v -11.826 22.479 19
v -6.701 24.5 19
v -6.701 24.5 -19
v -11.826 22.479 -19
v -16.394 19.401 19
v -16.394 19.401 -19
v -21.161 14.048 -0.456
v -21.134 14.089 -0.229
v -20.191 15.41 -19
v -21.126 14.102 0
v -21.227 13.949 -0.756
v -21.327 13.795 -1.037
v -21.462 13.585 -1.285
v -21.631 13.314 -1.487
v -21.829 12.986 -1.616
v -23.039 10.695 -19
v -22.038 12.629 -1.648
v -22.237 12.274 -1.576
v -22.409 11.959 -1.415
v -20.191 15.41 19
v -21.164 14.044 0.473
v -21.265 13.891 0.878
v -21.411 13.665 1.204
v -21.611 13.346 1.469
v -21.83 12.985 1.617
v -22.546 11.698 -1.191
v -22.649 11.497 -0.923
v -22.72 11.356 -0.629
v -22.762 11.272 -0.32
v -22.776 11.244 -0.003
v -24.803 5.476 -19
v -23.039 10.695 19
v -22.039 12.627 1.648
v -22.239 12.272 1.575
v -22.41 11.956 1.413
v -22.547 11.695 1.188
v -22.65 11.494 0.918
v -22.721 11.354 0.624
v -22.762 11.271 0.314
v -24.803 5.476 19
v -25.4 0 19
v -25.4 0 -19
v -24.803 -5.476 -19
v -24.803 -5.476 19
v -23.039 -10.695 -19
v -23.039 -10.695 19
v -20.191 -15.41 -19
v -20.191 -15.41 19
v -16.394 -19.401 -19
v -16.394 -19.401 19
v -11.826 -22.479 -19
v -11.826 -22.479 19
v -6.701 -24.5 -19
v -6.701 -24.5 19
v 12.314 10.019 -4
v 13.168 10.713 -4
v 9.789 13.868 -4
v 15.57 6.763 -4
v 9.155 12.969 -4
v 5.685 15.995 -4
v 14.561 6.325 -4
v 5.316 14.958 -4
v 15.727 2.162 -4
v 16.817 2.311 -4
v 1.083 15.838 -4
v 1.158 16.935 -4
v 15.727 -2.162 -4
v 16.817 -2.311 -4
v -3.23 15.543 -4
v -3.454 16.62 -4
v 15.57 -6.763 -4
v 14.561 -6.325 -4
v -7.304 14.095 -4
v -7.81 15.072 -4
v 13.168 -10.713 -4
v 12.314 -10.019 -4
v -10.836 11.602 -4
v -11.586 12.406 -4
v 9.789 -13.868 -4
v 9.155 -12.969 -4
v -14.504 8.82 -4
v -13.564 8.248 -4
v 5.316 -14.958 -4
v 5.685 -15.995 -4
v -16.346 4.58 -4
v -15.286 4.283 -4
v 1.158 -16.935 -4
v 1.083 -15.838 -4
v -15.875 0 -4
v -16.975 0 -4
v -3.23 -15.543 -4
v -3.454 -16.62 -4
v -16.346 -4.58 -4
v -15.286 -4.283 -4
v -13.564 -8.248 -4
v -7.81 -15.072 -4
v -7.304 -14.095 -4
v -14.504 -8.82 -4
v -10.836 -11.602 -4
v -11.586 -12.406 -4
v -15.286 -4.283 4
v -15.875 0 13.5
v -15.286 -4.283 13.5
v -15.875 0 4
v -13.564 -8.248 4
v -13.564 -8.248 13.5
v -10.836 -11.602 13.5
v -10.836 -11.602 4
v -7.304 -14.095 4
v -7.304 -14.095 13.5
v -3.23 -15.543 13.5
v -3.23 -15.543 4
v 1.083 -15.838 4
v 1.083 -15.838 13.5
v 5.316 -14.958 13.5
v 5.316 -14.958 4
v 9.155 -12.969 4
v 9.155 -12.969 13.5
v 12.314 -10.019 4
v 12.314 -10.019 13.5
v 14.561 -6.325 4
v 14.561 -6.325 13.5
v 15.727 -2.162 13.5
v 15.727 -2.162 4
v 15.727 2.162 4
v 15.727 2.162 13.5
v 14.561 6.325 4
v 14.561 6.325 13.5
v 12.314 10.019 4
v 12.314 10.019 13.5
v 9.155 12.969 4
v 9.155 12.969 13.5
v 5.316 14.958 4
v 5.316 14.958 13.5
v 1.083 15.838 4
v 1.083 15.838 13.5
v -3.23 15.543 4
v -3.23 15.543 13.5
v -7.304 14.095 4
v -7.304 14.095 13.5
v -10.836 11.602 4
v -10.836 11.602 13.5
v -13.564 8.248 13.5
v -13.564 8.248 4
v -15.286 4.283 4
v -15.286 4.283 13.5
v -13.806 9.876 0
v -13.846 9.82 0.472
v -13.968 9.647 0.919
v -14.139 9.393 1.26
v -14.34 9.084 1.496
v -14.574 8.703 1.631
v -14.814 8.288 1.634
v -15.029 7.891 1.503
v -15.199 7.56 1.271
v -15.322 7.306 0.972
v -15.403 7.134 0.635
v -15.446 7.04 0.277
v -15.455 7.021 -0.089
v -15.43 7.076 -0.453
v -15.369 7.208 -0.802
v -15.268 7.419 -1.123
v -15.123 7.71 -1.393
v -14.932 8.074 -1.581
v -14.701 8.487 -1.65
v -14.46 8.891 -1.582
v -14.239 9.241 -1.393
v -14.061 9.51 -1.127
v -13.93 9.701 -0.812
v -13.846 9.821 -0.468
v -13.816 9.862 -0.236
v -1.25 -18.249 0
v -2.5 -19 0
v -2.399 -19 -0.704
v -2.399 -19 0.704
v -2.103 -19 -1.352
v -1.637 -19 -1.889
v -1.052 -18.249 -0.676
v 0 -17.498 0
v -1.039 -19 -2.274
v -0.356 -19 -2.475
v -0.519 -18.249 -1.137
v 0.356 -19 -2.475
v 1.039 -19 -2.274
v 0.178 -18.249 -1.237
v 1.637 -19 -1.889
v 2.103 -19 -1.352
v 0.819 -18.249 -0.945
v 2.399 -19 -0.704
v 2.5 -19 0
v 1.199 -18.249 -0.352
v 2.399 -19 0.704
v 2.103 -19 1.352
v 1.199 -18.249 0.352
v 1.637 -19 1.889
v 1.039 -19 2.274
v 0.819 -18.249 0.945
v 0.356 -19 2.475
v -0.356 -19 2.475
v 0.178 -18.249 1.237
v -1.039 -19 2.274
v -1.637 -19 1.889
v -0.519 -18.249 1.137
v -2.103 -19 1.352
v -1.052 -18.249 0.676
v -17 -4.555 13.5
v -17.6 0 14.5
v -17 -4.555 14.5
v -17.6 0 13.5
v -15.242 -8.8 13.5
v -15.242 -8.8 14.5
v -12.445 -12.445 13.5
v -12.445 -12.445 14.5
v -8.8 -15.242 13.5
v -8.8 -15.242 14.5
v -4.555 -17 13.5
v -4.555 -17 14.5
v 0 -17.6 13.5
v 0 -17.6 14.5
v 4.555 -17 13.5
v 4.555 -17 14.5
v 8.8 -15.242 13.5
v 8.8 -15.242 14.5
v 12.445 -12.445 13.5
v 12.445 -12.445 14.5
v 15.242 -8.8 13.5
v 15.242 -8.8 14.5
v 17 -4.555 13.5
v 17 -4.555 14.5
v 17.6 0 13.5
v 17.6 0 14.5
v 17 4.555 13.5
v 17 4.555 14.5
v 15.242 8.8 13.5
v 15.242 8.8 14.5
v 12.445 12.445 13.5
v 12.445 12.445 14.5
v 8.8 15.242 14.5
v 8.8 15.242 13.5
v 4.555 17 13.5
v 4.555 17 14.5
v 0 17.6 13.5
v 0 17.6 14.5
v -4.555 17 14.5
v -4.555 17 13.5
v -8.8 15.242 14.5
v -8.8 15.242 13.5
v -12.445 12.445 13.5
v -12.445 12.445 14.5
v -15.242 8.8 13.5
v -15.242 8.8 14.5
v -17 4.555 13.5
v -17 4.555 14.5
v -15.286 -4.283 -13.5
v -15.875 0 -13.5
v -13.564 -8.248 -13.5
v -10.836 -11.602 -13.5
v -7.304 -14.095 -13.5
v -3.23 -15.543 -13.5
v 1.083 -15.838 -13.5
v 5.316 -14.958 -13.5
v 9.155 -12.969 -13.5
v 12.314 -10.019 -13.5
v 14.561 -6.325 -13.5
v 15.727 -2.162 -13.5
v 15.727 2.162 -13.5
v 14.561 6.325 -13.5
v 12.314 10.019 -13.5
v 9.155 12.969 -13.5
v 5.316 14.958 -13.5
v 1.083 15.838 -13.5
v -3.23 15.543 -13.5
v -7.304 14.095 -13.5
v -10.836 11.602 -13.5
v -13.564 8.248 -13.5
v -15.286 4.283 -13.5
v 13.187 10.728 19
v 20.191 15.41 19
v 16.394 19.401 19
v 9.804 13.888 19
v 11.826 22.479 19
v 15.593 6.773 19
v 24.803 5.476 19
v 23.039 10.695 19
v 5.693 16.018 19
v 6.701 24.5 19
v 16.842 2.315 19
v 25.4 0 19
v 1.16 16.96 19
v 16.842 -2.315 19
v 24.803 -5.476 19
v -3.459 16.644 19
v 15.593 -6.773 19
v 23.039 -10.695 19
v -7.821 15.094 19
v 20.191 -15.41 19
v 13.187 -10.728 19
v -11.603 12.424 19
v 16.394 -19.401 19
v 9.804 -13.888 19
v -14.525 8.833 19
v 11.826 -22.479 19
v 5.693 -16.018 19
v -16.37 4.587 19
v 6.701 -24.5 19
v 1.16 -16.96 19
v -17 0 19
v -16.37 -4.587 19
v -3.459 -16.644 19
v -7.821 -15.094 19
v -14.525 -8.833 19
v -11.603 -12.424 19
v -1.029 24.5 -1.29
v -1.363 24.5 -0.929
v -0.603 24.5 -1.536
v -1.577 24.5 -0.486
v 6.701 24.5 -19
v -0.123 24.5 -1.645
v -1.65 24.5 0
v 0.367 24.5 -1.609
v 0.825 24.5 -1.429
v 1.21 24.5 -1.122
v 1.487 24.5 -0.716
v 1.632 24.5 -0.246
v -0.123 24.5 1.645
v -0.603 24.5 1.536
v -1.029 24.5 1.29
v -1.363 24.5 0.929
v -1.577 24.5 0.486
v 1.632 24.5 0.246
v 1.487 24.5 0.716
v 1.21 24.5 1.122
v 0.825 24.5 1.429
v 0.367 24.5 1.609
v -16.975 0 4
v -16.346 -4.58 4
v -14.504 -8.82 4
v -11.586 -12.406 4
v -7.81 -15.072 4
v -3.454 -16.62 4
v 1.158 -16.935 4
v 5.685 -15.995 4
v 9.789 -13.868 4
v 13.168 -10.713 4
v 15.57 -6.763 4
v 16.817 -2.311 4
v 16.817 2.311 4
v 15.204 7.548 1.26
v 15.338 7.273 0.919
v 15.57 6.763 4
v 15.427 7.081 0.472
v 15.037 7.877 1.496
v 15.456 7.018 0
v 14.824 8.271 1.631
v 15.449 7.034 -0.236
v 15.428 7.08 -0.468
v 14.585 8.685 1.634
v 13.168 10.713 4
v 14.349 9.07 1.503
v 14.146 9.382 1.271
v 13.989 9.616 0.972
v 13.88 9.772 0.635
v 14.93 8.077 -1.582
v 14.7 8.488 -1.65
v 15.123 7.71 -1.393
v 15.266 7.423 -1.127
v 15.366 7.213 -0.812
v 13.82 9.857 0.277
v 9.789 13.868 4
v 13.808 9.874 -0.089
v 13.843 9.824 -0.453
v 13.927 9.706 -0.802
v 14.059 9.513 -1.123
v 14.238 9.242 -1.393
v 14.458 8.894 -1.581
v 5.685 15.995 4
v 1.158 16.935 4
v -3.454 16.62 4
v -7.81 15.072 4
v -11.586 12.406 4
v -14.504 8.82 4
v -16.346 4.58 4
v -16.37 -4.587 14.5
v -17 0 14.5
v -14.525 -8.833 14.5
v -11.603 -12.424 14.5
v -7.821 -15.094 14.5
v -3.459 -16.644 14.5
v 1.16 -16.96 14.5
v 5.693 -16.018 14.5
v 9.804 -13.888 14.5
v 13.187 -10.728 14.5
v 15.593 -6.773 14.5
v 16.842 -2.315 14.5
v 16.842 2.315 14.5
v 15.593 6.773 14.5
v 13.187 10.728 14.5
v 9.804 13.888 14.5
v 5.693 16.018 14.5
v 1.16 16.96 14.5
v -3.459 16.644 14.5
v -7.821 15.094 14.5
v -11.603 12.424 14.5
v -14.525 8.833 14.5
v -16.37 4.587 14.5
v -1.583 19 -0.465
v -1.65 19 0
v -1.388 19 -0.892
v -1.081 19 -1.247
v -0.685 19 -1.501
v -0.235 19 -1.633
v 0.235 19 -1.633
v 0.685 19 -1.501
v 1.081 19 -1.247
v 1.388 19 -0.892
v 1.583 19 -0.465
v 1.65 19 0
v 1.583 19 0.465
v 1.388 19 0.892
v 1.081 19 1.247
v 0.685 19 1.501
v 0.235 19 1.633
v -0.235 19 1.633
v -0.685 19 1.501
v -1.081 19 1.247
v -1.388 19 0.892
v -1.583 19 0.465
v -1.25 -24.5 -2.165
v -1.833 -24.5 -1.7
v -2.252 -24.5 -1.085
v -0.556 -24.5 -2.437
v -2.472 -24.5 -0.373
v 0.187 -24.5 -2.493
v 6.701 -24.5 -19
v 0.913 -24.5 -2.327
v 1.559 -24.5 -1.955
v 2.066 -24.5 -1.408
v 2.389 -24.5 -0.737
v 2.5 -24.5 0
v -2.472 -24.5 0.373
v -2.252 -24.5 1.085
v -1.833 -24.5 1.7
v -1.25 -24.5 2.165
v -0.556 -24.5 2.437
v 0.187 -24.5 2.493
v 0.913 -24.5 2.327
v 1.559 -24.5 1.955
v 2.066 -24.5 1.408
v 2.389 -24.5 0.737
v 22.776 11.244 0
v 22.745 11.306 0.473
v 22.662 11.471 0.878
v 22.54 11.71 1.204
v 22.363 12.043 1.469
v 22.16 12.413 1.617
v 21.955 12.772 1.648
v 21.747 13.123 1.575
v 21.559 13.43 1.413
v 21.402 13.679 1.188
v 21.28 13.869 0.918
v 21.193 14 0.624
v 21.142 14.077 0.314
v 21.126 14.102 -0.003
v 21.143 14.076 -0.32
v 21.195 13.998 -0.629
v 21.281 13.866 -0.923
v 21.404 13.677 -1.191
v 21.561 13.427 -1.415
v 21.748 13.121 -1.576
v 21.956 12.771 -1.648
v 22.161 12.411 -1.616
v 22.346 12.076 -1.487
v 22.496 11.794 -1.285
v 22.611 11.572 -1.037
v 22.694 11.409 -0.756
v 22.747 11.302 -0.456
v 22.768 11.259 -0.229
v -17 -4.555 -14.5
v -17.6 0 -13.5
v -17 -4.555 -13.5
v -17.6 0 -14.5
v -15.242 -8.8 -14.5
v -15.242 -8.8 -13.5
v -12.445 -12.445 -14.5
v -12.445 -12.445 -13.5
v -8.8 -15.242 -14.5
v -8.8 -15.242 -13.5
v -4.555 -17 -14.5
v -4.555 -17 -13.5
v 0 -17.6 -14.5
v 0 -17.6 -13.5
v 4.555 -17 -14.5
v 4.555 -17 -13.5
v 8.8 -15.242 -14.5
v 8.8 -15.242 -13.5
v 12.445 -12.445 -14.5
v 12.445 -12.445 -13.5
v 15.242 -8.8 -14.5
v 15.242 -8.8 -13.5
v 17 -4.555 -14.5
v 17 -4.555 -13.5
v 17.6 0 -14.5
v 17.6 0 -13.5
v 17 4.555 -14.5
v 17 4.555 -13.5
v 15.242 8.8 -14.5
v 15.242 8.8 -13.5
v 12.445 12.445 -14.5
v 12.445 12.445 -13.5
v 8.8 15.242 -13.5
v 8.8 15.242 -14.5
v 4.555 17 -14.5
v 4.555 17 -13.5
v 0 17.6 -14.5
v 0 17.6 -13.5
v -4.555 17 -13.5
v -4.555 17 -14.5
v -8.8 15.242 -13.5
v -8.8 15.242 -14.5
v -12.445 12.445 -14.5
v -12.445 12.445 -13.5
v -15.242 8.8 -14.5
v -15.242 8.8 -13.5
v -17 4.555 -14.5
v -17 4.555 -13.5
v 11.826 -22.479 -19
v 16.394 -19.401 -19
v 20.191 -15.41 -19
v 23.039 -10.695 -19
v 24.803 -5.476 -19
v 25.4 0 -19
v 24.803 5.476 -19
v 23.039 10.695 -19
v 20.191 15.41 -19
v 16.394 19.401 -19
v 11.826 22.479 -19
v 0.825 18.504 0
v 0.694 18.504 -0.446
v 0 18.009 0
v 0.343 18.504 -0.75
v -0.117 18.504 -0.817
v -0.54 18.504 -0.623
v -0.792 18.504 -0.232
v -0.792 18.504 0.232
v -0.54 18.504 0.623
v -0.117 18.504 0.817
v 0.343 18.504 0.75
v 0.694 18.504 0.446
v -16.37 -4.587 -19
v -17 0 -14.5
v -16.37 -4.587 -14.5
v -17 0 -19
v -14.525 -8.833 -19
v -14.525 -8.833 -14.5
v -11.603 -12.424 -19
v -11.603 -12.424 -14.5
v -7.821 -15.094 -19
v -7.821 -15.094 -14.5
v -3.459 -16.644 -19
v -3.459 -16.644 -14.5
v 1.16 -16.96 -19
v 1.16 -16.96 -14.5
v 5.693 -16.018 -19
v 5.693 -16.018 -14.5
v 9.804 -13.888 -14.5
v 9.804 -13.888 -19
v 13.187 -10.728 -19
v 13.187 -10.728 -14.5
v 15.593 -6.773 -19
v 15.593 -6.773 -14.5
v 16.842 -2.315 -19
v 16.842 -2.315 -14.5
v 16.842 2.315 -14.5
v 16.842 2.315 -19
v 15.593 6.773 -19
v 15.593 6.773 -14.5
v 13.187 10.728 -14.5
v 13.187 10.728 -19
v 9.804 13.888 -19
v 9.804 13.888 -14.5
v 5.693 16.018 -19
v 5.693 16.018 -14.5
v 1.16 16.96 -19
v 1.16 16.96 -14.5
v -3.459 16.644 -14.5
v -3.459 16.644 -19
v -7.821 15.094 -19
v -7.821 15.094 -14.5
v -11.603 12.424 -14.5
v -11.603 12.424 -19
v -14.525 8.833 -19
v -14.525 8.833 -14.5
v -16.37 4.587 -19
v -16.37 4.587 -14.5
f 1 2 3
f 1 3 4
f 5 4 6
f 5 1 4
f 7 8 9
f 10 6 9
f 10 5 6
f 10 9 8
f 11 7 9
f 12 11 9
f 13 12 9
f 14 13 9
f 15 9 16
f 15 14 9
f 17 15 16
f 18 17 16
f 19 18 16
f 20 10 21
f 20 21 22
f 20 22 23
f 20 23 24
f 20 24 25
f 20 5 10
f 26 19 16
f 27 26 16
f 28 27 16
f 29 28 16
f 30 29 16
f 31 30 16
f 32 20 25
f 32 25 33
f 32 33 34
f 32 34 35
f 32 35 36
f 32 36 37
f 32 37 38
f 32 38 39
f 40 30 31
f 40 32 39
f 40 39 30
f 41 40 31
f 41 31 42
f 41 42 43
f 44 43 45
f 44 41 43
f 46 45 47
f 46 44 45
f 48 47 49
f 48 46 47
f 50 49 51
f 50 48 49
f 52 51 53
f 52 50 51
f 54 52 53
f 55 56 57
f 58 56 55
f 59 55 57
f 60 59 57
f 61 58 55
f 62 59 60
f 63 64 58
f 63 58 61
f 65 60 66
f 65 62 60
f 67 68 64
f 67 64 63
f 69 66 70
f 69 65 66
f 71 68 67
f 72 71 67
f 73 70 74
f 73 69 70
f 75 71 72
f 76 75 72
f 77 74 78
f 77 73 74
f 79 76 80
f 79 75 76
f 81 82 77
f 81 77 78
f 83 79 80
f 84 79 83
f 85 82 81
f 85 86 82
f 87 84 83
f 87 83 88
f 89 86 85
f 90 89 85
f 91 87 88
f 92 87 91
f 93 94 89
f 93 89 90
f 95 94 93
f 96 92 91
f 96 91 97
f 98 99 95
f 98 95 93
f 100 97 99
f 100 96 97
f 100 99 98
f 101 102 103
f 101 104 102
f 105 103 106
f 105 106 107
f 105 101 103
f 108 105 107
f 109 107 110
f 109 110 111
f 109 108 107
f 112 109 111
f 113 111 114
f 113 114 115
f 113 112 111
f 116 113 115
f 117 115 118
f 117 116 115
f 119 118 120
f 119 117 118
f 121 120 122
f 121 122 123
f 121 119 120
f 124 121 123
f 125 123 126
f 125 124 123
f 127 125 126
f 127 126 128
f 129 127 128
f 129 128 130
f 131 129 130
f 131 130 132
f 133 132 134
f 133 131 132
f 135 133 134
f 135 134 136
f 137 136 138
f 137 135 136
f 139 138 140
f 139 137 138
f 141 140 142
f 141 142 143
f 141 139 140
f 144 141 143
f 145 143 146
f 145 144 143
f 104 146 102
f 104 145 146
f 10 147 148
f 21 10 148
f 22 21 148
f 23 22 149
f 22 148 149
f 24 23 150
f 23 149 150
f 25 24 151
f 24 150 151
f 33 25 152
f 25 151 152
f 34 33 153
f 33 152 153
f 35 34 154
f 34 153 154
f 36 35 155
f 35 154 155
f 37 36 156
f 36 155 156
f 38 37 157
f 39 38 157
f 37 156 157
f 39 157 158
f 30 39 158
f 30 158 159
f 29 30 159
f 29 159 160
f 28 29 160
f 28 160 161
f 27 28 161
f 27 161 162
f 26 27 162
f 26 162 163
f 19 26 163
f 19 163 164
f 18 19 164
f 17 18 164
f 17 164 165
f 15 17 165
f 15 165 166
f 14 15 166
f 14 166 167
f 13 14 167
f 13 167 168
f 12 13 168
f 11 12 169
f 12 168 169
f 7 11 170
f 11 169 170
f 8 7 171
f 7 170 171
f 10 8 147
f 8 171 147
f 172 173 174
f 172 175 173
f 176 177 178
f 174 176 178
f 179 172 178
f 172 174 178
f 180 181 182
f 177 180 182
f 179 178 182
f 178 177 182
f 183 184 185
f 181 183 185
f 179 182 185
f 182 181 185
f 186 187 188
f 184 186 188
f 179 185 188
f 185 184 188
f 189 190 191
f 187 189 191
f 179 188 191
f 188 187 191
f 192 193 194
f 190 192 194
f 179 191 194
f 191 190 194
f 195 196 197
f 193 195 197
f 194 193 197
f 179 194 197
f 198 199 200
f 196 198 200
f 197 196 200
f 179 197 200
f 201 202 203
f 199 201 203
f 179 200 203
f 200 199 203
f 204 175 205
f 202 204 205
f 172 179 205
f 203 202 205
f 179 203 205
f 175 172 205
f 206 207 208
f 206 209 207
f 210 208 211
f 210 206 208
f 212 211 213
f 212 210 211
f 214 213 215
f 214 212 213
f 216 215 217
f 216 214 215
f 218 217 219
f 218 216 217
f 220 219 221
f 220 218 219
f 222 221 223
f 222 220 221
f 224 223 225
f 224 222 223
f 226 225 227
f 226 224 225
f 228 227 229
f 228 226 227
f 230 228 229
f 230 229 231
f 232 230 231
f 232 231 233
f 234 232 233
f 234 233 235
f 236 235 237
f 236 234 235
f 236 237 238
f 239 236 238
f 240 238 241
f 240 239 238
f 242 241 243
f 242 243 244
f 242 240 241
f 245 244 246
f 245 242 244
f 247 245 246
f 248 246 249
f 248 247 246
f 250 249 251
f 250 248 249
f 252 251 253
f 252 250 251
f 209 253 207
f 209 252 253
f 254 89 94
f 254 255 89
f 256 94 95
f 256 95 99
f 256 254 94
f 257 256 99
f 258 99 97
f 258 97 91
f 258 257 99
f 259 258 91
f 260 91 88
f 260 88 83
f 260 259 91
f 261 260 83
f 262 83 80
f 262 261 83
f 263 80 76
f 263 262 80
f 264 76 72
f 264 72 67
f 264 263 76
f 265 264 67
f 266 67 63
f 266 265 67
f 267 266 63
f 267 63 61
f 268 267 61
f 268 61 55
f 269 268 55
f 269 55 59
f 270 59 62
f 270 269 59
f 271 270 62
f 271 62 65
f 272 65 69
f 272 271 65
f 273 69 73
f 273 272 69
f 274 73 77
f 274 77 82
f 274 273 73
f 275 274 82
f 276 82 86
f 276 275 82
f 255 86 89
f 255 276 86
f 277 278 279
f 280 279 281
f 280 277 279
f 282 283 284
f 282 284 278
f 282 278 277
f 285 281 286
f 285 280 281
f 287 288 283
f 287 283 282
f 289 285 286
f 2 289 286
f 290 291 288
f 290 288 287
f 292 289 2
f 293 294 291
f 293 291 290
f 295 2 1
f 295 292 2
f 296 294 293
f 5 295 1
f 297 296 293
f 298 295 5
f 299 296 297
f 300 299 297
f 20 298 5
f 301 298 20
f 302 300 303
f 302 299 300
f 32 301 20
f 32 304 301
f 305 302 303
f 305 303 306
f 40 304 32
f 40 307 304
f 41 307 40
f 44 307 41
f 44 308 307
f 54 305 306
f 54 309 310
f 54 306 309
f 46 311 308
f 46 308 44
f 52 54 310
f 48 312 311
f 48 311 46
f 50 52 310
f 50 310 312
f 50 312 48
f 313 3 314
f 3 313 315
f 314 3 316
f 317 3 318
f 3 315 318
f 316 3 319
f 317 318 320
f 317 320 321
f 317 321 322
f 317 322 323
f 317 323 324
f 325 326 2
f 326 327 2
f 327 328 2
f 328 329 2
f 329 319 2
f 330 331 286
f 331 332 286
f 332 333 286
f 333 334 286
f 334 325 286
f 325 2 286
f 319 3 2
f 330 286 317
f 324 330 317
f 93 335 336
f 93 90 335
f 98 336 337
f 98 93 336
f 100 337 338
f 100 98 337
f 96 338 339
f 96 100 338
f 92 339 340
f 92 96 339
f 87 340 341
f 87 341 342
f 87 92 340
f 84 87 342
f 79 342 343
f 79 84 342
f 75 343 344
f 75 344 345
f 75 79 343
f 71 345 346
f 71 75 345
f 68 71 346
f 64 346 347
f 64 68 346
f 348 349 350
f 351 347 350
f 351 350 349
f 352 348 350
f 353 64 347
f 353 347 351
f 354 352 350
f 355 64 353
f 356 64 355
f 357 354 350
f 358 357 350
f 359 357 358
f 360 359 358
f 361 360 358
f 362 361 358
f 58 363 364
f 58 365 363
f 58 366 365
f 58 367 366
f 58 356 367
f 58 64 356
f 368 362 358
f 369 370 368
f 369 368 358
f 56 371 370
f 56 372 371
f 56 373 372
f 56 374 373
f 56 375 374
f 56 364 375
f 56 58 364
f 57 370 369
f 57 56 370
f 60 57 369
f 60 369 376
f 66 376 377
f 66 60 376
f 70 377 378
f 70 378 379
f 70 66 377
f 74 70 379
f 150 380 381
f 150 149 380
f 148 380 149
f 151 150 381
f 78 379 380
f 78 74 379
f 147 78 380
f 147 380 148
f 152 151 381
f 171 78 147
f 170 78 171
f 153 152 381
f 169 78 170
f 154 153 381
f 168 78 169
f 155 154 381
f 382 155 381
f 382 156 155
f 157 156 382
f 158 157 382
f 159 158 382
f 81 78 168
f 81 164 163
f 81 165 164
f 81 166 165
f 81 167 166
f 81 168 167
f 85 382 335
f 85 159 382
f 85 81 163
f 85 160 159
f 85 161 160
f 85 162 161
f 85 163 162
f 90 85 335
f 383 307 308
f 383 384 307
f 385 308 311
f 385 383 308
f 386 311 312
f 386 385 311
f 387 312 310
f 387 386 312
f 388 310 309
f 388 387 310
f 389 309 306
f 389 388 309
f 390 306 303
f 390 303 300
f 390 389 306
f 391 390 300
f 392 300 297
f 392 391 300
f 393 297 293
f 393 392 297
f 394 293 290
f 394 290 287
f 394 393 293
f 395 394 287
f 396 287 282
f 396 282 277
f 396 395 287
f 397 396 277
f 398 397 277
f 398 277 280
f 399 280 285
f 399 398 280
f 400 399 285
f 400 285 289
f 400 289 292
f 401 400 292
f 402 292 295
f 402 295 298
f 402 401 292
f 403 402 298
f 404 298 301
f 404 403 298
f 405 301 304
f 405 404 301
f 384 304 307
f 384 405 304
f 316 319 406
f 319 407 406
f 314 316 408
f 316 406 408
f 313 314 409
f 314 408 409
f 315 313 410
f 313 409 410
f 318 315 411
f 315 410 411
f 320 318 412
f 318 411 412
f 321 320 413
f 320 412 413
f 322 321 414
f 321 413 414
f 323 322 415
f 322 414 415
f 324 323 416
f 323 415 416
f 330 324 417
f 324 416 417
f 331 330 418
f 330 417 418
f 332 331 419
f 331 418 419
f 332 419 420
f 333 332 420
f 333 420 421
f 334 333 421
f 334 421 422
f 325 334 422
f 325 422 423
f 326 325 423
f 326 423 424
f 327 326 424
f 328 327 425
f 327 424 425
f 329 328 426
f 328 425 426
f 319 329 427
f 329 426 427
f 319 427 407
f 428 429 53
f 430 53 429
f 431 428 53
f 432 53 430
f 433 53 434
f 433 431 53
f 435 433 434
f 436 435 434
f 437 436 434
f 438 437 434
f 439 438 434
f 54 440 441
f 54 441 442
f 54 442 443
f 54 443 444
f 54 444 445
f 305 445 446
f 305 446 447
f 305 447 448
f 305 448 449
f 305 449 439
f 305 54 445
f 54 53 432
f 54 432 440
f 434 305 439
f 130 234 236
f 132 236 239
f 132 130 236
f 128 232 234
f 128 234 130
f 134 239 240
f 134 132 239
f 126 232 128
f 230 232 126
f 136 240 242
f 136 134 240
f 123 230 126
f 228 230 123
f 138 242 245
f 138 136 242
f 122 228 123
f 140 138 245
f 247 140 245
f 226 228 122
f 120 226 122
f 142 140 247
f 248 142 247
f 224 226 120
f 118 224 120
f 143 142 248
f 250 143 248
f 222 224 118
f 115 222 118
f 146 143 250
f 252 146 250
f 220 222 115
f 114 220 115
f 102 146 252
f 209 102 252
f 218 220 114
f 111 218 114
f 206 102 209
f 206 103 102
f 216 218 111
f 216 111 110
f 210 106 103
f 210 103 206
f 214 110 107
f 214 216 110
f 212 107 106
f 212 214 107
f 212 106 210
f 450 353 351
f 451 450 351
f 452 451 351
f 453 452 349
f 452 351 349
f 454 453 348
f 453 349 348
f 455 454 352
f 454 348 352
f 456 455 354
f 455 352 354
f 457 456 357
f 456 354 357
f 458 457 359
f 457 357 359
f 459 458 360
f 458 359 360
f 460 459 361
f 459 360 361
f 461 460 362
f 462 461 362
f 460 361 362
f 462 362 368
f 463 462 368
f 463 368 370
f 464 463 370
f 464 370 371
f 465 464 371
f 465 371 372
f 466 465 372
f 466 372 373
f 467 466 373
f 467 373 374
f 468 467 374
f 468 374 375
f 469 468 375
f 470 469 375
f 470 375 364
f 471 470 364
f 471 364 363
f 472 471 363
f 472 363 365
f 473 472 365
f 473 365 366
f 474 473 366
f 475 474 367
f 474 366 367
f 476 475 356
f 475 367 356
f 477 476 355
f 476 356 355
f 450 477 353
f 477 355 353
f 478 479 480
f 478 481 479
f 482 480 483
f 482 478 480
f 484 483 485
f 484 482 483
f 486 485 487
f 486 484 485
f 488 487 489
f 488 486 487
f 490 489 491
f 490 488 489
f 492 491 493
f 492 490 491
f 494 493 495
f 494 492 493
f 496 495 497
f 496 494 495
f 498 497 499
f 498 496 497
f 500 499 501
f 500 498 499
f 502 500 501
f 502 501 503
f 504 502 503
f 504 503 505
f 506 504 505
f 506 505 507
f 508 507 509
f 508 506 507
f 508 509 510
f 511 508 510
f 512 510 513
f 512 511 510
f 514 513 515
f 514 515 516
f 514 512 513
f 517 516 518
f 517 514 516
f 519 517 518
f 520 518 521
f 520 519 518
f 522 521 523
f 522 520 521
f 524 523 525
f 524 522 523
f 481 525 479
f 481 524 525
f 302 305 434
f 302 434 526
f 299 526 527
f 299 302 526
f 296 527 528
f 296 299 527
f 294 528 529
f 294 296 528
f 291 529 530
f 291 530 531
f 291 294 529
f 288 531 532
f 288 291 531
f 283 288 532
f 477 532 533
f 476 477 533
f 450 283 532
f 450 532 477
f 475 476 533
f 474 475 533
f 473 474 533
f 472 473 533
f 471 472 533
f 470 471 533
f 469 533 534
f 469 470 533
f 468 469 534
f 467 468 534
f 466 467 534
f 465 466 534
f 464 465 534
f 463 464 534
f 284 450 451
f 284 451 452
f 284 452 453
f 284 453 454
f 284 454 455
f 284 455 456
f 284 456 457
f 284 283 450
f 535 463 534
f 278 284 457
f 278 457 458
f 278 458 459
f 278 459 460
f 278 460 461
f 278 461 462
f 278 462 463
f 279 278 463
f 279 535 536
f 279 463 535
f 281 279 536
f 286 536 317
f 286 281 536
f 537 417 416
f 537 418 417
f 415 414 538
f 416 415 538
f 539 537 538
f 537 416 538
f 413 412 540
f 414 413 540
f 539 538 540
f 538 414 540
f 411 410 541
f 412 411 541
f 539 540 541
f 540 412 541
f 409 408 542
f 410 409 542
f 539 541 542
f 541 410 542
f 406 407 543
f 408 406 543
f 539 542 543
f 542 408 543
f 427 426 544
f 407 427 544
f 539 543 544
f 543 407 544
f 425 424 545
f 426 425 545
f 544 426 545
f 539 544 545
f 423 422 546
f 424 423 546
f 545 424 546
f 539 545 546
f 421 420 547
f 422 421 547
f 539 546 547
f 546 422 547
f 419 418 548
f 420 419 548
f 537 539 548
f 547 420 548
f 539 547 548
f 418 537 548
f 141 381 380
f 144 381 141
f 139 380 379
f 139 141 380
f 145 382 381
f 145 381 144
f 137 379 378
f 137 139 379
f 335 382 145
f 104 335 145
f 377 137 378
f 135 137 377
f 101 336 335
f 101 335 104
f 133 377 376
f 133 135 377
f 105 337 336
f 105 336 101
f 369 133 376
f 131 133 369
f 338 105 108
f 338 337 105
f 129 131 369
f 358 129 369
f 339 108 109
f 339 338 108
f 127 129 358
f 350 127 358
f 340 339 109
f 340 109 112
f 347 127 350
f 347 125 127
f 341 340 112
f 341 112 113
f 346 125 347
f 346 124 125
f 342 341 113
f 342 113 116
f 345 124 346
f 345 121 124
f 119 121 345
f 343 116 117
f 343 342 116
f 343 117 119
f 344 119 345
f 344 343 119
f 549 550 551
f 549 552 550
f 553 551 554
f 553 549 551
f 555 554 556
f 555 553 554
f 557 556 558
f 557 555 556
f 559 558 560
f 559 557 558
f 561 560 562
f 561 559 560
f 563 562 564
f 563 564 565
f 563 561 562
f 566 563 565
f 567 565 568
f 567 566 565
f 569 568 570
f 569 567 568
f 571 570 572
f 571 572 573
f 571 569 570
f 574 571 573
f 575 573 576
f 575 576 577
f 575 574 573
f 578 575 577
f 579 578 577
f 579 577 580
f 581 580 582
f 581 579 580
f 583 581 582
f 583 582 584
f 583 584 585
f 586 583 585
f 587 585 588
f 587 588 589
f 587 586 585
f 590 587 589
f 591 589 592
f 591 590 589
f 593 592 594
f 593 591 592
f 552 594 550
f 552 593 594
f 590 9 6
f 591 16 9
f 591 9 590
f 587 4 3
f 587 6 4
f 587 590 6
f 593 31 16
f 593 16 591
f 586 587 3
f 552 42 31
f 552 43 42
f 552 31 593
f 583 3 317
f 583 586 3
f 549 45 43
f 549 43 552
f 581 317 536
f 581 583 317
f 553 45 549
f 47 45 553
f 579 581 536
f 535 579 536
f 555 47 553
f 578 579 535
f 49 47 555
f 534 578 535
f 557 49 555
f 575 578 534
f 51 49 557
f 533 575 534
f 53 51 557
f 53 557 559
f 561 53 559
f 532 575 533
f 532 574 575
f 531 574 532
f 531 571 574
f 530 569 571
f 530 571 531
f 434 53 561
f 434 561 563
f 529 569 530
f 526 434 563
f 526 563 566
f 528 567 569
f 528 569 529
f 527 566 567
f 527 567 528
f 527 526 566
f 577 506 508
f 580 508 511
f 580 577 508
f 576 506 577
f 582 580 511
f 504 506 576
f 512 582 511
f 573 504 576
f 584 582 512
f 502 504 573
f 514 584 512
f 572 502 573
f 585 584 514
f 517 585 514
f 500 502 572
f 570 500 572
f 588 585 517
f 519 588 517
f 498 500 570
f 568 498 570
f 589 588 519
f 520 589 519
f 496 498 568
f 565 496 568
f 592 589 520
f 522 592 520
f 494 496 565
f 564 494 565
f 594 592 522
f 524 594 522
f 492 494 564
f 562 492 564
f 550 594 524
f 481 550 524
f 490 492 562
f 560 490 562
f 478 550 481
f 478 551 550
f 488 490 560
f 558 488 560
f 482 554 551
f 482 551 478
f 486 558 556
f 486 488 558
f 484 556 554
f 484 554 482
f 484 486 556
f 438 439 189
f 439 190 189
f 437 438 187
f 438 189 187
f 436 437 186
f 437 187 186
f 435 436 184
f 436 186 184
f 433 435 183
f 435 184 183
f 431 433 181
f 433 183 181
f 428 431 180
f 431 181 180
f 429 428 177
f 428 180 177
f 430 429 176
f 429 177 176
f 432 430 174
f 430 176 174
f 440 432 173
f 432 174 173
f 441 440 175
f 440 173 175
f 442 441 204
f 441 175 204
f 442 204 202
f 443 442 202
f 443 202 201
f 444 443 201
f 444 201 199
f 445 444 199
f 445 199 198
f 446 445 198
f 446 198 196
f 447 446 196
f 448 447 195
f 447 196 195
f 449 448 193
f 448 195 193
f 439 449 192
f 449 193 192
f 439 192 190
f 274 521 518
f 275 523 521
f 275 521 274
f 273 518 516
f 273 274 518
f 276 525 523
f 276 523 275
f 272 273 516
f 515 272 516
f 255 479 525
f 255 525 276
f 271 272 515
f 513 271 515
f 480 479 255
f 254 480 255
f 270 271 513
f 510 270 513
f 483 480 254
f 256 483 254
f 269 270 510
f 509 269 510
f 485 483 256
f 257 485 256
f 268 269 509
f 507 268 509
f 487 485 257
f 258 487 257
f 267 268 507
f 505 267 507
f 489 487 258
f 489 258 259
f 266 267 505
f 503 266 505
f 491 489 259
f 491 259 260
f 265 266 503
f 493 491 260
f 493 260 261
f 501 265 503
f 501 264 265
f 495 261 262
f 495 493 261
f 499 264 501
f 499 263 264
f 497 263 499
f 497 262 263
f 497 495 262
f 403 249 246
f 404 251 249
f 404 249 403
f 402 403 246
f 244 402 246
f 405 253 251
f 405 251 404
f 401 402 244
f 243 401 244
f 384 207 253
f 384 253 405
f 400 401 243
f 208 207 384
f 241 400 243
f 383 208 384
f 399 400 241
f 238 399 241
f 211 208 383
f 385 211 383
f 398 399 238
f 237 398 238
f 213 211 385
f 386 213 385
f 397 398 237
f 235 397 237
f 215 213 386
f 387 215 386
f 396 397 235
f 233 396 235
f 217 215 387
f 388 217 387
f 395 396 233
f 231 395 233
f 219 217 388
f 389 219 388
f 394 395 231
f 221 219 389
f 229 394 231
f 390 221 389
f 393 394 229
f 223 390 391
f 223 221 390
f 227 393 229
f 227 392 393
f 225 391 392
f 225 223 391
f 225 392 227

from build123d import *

# Parameters (mm, degrees)
SKETCH_2_W                       = 64.02174429
SKETCH_2_H                       = 9.248919907
CUT_EXTRUDE_1_DEPTH              = 49
HOLE_WIZARD_M4_2_D               = 3.3
HOLE_WIZARD_M4_2_DEPTH           = 5.5
HOLE_WIZARD_M4_2_TIP             = 0.991420021
HOLE_WIZARD_M6_2_D               = 5
HOLE_WIZARD_M6_2_DEPTH           = 5.5
HOLE_WIZARD_M6_2_TIP             = 1.502151548
HOLE_WIZARD_M4_3_D               = 3.3
HOLE_WIZARD_M4_3_DEPTH           = 10.1
HOLE_WIZARD_M4_3_TIP             = 0.991420021
HOLE_WIZARD_M4_3_ON_FACE_2_D     = 3.3
HOLE_WIZARD_M4_3_ON_FACE_2_DEPTH = 10.1
HOLE_WIZARD_M4_3_ON_FACE_2_TIP   = 0.991420021


with BuildPart() as part:
    # 草图1 → 旋转1 (revolve)
    with BuildSketch(Plane(origin=(0, 0, 0), x_dir=(1, 0, 0), z_dir=(0, 1, 0)), mode=Mode.PRIVATE) as revolve_1_sk:
        Polygon((25.4, 19), (25.4, -19), (17, -19), (17, -14.5), (17.6, -14.5), (17.6, -13.5), (15.875, -13.5), (15.875, -4), (16.975, -4), (16.975, 4), (15.875, 4), (15.875, 13.5), (17.6, 13.5), (17.6, 14.5), (17, 14.5), (17, 19), align=None)
    revolve(revolve_1_sk.sketch.rotate(Axis((0, 0, -31.9390681), (0, 0, 1)), 180), axis=Axis((0, 0, -31.9390681), (0, 0, 1)))  # turned: the seam where the file's is

    # 草图2 → 切除-拉伸1 (cut)
    with BuildSketch(Plane.XY.offset(19)):
        with Locations((-1.141100508, 29.124459954)):
            Rectangle(SKETCH_2_W, SKETCH_2_H)
        with Locations((-1.141100508, -29.124459954)):
            Rectangle(SKETCH_2_W, SKETCH_2_H)
    extrude(amount=-CUT_EXTRUDE_1_DEPTH, mode=Mode.SUBTRACT)

    # M4 螺纹孔2
    with Locations(Plane(origin=(0, 24.5, 0), x_dir=(1, 0, 0), z_dir=(0, 1, 0))):
        with Locations((0, 0)):
            Hole(HOLE_WIZARD_M4_2_D / 2, depth=HOLE_WIZARD_M4_2_DEPTH)
            with Locations((0, 0, -(HOLE_WIZARD_M4_2_DEPTH + HOLE_WIZARD_M4_2_TIP / 2))):  # 118° drill point
                Cone(0, HOLE_WIZARD_M4_2_D / 2, HOLE_WIZARD_M4_2_TIP, mode=Mode.SUBTRACT)

    # M6 螺纹孔2
    with Locations(Plane(origin=(0, -24.5, 0), x_dir=(-1, 0, 0), z_dir=(0, -1, 0))):
        with Locations((0, 0)):
            Hole(HOLE_WIZARD_M6_2_D / 2, depth=HOLE_WIZARD_M6_2_DEPTH)
            with Locations((0, 0, -(HOLE_WIZARD_M6_2_DEPTH + HOLE_WIZARD_M6_2_TIP / 2))):  # 118° drill point
                Cone(0, HOLE_WIZARD_M6_2_D / 2, HOLE_WIZARD_M6_2_TIP, mode=Mode.SUBTRACT)

    # M4 螺纹孔3
    with Locations(Plane(origin=(21.997045256, 12.7, 0), x_dir=(-0.5, 0.866025404, 0), z_dir=(0.866025404, 0.5, 0))):
        with Locations((0, 0)):
            Hole(HOLE_WIZARD_M4_3_D / 2, depth=HOLE_WIZARD_M4_3_DEPTH)
            with Locations((0, 0, -(HOLE_WIZARD_M4_3_DEPTH + HOLE_WIZARD_M4_3_TIP / 2))):  # 118° drill point
                Cone(0, HOLE_WIZARD_M4_3_D / 2, HOLE_WIZARD_M4_3_TIP, mode=Mode.SUBTRACT)

    # M4 螺纹孔3 on face 2
    with Locations(Plane(origin=(-21.997045256, 12.7, 0), x_dir=(-0.500000175, -0.866025303, 0), z_dir=(-0.866025303, 0.500000175, 0))):
        with Locations((0, 0)):
            Hole(HOLE_WIZARD_M4_3_ON_FACE_2_D / 2, depth=HOLE_WIZARD_M4_3_ON_FACE_2_DEPTH)
            with Locations((0, 0, -(HOLE_WIZARD_M4_3_ON_FACE_2_DEPTH + HOLE_WIZARD_M4_3_ON_FACE_2_TIP / 2))):  # 118° drill point
                Cone(0, HOLE_WIZARD_M4_3_ON_FACE_2_D / 2, HOLE_WIZARD_M4_3_ON_FACE_2_TIP, mode=Mode.SUBTRACT)


solid = part.part
